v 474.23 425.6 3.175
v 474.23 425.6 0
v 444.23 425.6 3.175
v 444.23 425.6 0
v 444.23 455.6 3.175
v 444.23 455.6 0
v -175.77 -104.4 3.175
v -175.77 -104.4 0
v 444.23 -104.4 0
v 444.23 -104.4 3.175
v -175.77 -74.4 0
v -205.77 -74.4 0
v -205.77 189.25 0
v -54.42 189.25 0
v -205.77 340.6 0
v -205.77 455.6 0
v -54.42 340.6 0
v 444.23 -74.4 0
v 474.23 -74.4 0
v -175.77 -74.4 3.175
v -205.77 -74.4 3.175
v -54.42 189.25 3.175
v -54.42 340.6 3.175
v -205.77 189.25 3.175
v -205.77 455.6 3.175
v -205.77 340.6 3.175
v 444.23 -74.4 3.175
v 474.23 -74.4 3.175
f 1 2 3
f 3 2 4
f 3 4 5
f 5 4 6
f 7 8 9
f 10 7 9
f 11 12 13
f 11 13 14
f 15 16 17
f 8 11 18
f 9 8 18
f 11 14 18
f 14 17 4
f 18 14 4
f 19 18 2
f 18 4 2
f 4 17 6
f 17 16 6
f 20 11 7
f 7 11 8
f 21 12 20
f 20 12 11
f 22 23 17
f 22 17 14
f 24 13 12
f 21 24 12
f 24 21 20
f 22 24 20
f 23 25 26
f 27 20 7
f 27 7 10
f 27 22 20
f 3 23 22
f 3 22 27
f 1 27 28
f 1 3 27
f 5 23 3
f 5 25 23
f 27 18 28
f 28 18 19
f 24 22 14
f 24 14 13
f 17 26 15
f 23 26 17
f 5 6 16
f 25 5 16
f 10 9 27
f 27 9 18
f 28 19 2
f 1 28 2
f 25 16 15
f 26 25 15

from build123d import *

# Parameters (mm, degrees)
SALIENTE_EXTRUIR1_DEPTH = 3.175
CORTAR_EXTRUIR1_DEPTH   = 10


with BuildPart() as part:
    # Croquis1 → Saliente-Extruir1 (new body)
    with BuildSketch(Plane.XY):
        Polygon((-205.770387244, 310.6), (-205.770387244, -74.4), (-175.770387244, -74.4), (-175.770387244, -104.4), (444.229612756, -104.4), (444.229612756, -74.4), (474.229612756, -74.4), (474.229612756, 425.6), (444.229612756, 425.6), (444.229612756, 455.6), (-205.770387244, 455.6), (-205.770387244, 340.6), (-175.770387244, 340.6), (-175.770387244, 310.6), align=None)
    extrude(amount=SALIENTE_EXTRUIR1_DEPTH)

    # Croquis2 → Cortar-Extruir1 (cut)
    with BuildSketch(Plane.XY.offset(3.175)):
        Polygon((-205.770387244, 310.6), (-175.770387244, 310.6), (-175.770387244, 340.6), (-54.420387244, 340.6), (-54.420387244, 189.25), (-205.770387244, 189.25), align=None)
    extrude(amount=-CORTAR_EXTRUIR1_DEPTH, mode=Mode.SUBTRACT)


solid = part.part
